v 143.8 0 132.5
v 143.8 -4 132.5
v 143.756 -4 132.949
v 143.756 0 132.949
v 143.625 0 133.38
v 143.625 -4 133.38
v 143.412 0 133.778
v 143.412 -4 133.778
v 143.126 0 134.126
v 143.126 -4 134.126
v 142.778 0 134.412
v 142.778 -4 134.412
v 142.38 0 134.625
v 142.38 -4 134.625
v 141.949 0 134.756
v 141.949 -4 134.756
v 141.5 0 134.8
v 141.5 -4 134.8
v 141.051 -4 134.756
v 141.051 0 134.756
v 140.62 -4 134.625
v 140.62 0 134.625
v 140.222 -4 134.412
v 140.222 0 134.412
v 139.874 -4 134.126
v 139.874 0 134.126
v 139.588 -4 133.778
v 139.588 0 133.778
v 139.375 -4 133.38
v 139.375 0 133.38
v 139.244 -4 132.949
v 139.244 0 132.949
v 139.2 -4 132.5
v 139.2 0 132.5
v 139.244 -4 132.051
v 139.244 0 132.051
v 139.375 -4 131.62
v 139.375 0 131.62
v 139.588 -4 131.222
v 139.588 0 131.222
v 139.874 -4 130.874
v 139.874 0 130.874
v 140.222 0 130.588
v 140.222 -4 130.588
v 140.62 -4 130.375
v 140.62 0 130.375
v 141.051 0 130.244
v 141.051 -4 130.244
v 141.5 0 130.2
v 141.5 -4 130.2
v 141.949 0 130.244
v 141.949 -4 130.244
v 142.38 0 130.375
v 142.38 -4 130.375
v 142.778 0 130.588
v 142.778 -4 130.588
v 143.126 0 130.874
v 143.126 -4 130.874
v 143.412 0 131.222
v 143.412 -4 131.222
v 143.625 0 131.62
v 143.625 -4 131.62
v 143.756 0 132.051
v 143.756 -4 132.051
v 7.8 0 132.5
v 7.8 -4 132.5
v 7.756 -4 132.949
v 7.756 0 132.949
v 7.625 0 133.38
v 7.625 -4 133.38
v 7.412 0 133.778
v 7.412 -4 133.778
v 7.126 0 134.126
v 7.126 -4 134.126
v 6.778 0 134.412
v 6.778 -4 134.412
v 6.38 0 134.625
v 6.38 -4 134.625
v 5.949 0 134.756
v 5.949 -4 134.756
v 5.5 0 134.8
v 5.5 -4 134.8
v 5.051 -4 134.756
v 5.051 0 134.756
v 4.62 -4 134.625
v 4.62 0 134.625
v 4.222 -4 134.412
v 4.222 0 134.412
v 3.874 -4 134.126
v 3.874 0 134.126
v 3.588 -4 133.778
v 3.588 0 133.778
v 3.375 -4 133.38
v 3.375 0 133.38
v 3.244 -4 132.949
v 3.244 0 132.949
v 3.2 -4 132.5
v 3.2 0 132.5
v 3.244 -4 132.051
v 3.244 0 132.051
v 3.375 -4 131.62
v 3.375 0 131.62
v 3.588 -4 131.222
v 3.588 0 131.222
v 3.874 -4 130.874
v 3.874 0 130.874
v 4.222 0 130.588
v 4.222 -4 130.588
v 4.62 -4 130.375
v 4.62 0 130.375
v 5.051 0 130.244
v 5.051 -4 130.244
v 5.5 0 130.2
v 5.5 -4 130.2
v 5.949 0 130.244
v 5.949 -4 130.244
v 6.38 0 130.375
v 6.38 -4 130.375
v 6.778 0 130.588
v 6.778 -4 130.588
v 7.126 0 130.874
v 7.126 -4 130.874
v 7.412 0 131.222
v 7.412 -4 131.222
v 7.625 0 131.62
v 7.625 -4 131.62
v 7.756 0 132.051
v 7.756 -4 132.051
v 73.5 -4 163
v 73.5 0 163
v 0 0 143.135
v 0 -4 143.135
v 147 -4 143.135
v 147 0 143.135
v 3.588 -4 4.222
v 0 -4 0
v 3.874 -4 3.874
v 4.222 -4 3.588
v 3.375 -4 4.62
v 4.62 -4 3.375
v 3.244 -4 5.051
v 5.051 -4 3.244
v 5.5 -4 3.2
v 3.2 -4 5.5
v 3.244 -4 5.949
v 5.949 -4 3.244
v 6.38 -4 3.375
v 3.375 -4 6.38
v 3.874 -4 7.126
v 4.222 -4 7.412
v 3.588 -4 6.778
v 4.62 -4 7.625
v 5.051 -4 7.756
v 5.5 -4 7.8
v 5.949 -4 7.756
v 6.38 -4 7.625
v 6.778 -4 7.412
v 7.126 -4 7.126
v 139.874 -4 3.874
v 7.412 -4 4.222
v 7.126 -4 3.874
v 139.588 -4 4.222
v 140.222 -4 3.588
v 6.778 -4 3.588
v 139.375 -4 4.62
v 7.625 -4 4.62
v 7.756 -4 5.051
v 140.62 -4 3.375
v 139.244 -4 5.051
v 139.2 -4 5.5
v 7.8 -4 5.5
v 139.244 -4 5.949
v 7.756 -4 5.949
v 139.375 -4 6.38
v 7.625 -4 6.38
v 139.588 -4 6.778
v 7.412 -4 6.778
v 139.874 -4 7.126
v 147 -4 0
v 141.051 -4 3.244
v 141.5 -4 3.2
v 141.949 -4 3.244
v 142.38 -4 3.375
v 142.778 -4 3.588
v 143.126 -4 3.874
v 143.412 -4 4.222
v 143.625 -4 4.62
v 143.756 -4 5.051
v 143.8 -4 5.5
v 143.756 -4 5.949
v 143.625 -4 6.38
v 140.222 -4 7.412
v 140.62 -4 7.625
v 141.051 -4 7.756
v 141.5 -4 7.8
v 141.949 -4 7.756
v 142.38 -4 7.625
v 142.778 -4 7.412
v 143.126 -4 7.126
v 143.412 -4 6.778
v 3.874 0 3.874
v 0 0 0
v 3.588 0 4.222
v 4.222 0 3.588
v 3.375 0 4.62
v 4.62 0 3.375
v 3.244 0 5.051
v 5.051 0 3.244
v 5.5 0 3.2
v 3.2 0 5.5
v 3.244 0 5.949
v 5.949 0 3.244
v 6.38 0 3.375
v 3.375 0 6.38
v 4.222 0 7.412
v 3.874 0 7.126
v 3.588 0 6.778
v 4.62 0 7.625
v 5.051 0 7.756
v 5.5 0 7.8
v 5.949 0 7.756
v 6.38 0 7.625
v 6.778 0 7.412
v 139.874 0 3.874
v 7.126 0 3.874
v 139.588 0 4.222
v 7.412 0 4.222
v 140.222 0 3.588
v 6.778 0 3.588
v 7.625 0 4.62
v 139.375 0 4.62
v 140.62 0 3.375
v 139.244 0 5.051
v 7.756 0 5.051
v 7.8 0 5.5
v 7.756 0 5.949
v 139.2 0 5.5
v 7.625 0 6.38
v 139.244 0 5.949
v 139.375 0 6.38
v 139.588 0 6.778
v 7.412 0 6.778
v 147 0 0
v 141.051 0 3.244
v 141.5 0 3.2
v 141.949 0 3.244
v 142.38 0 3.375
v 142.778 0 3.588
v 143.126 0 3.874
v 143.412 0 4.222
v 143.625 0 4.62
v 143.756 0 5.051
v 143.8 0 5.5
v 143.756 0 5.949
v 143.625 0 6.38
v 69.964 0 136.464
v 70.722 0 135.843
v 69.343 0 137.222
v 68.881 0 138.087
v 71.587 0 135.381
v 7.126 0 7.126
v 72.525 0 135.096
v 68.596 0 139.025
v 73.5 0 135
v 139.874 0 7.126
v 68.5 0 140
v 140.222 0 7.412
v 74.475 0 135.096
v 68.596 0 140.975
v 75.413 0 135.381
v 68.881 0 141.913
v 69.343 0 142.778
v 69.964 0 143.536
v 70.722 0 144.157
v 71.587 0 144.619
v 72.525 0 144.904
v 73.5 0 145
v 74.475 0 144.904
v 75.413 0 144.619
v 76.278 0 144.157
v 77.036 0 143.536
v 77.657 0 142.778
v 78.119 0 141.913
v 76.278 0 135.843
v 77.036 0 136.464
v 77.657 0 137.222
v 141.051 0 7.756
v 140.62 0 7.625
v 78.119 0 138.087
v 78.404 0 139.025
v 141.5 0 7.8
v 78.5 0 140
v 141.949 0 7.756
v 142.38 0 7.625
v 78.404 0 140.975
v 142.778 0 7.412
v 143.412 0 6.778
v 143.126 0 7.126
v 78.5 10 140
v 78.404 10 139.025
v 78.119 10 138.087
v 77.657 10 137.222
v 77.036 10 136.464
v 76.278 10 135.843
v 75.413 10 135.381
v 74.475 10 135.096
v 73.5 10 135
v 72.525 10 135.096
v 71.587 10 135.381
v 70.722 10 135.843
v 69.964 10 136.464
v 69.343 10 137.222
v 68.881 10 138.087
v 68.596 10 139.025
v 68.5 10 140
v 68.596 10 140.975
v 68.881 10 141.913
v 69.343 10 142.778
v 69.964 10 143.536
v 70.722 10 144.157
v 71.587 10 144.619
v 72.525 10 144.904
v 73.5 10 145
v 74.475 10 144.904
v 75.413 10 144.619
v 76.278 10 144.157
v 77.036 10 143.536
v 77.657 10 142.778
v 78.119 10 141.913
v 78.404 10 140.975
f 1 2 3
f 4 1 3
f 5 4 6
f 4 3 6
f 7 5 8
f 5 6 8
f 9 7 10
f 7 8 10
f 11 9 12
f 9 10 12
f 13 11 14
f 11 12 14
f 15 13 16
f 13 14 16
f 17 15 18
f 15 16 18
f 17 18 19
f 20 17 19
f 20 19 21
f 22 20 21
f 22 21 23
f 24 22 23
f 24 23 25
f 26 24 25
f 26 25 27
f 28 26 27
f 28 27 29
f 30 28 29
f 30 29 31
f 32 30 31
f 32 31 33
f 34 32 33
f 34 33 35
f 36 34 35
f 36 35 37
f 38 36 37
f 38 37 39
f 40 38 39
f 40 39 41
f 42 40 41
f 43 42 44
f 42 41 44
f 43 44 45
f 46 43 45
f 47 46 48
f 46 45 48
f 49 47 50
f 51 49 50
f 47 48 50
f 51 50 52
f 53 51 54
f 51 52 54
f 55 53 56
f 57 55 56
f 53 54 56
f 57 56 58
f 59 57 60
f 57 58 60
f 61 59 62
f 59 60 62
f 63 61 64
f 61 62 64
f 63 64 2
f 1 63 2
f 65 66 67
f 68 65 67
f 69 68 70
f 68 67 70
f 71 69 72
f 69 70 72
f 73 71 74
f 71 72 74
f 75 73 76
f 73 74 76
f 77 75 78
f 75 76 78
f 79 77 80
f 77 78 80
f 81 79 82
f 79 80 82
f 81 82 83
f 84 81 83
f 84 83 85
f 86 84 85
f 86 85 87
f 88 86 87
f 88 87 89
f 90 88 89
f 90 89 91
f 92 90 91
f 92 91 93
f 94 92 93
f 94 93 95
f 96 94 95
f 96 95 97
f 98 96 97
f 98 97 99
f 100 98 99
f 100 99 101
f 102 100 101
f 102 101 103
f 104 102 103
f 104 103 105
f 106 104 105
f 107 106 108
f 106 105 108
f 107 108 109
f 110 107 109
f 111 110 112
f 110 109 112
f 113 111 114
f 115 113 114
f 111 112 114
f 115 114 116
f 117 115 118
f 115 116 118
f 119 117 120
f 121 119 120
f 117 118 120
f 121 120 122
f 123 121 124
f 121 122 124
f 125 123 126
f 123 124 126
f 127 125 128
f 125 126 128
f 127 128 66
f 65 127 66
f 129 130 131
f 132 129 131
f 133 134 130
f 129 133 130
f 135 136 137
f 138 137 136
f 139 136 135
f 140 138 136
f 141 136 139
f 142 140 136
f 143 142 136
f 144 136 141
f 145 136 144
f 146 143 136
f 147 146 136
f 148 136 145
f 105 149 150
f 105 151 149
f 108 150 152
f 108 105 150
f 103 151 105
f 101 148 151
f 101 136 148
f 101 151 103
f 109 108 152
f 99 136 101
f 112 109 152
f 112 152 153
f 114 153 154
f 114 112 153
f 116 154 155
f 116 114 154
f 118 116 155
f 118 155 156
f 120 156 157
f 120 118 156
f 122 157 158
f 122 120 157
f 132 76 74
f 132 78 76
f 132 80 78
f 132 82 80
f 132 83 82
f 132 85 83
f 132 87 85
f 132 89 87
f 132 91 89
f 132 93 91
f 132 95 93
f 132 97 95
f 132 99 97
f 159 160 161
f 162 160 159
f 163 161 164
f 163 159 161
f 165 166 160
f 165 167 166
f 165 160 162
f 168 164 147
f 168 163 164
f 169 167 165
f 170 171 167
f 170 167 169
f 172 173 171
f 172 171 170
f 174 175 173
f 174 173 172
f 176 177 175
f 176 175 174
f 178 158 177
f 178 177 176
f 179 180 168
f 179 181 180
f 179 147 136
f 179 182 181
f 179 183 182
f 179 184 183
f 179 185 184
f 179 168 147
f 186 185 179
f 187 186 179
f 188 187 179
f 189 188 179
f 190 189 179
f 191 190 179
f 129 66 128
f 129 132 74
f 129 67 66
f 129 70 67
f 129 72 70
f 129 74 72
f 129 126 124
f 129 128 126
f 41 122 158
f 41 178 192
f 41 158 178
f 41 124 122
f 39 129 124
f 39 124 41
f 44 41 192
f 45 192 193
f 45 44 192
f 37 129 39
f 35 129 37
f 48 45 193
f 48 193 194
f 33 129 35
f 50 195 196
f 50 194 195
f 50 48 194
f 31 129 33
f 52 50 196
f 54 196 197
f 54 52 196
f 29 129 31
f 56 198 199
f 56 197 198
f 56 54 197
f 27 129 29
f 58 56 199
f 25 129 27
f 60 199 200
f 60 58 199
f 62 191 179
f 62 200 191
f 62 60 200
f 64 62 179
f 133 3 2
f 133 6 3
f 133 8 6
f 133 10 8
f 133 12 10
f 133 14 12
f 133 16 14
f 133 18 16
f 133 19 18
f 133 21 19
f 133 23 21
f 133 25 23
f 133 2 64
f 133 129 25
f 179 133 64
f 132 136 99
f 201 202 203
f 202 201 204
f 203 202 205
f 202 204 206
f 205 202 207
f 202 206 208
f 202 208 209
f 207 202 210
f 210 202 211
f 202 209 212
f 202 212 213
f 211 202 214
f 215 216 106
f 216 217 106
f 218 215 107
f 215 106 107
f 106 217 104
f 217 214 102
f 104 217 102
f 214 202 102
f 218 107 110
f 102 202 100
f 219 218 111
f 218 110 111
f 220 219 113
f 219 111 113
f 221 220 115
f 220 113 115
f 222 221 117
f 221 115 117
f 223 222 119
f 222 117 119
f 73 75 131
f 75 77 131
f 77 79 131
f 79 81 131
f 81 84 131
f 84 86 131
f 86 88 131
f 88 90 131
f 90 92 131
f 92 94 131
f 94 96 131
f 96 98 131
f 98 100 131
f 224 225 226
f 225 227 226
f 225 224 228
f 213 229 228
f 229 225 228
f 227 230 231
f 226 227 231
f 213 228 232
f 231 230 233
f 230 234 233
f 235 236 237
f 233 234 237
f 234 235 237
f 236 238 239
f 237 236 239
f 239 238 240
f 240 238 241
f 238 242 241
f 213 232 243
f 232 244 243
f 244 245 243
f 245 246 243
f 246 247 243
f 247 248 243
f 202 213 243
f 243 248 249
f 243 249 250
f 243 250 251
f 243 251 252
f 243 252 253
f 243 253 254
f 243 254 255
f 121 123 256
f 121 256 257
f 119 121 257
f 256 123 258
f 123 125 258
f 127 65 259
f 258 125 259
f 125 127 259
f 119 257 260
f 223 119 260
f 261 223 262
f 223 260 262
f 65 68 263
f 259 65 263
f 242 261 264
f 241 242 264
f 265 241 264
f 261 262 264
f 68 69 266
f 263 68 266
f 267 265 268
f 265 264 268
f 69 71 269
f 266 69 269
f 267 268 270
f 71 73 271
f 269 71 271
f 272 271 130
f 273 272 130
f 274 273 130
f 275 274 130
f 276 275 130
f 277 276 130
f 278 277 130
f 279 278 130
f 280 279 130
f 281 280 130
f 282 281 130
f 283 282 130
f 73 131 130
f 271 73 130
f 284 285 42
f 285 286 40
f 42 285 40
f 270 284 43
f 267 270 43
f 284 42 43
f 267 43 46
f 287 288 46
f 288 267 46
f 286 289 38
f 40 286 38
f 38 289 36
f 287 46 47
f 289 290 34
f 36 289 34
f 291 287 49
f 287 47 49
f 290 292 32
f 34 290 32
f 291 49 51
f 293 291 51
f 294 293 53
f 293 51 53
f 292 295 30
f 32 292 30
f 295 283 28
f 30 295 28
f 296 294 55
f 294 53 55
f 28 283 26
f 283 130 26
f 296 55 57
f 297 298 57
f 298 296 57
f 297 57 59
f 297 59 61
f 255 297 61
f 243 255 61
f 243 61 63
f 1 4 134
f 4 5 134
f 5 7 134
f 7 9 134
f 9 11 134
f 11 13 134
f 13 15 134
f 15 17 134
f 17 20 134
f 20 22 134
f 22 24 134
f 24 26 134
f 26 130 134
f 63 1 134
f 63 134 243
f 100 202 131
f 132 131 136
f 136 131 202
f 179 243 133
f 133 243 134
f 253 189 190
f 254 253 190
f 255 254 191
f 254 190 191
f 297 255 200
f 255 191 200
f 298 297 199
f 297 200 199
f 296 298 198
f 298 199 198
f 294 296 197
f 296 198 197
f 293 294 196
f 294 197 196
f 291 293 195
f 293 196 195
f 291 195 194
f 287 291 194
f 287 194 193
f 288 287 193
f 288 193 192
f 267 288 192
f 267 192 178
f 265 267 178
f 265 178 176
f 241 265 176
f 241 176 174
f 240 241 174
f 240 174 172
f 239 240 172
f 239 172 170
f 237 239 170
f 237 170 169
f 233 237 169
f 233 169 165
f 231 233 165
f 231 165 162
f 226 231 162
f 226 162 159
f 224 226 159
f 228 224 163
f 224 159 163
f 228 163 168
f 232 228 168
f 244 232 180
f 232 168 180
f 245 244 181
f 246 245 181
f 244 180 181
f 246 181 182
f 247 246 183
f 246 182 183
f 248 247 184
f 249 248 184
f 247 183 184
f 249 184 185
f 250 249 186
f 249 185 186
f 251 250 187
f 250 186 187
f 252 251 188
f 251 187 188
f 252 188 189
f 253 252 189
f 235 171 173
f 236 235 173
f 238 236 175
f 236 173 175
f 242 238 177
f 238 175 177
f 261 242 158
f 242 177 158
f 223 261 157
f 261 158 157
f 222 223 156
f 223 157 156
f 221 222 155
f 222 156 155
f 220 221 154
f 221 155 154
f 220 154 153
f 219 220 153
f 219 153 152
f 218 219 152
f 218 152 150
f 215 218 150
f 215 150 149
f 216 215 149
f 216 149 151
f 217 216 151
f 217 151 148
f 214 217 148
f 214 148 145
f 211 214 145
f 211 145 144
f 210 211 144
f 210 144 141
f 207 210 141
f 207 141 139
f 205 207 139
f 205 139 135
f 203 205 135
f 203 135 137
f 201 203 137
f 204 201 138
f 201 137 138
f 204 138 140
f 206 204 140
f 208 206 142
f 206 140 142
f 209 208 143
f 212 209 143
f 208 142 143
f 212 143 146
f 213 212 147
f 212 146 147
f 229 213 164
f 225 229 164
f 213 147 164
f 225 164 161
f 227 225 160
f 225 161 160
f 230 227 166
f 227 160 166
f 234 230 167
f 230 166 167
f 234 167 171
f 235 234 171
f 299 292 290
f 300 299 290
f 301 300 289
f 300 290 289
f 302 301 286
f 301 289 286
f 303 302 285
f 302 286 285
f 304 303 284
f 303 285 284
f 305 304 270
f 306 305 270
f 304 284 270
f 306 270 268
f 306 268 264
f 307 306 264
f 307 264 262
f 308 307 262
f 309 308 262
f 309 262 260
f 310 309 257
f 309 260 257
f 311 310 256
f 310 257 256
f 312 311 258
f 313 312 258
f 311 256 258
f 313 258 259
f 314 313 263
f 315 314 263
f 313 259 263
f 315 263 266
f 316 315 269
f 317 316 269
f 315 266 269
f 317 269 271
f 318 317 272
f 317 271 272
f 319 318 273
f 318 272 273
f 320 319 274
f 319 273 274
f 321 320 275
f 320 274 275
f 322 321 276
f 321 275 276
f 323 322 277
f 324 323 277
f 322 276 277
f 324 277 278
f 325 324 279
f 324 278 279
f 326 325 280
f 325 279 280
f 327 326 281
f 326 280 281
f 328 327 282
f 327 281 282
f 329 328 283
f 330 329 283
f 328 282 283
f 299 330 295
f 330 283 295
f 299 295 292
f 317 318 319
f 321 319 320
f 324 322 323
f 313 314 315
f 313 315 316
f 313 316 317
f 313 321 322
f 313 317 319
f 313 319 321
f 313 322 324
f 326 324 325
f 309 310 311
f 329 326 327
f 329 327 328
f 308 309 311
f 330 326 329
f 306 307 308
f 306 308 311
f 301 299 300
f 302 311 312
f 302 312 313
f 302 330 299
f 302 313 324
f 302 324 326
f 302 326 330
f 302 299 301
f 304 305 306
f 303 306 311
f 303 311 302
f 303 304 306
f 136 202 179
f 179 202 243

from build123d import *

# Parameters (mm, degrees)
PAD_DEPTH    = 4
SKETCH001_R  = 2.3
POCKET_DEPTH = 5
SKETCH002_R  = 5
PAD001_DEPTH = 10


with BuildPart() as part:
    # Sketch → Pad (new body)
    with BuildSketch(Plane.XZ):
        Polygon((0, 0), (147, 0), (147, 143.135135), (73.5, 163), (0, 143.135135), align=None)
    extrude(amount=PAD_DEPTH)

    # Sketch001 (on Face7 of Pad) → Pocket (cut)
    with BuildSketch(Plane.XZ.offset(4)):
        with Locations((5.5, 5.5)):
            Circle(SKETCH001_R)
        with Locations((141.5, 5.5)):
            Circle(SKETCH001_R)
        with Locations((141.5, 132.5)):
            Circle(SKETCH001_R)
        with Locations((5.5, 132.5)):
            Circle(SKETCH001_R)
    extrude(amount=-POCKET_DEPTH, mode=Mode.SUBTRACT)

    # Sketch002 (on Face4 of Pocket) → Pad001 (join)
    with BuildSketch(Plane(origin=(0, 0, 0), x_dir=(1, 0, 0), z_dir=(0, 1, 0))):
        with Locations((73.5, -140)):
            Circle(SKETCH002_R)
    extrude(amount=PAD001_DEPTH)


solid = part.part
